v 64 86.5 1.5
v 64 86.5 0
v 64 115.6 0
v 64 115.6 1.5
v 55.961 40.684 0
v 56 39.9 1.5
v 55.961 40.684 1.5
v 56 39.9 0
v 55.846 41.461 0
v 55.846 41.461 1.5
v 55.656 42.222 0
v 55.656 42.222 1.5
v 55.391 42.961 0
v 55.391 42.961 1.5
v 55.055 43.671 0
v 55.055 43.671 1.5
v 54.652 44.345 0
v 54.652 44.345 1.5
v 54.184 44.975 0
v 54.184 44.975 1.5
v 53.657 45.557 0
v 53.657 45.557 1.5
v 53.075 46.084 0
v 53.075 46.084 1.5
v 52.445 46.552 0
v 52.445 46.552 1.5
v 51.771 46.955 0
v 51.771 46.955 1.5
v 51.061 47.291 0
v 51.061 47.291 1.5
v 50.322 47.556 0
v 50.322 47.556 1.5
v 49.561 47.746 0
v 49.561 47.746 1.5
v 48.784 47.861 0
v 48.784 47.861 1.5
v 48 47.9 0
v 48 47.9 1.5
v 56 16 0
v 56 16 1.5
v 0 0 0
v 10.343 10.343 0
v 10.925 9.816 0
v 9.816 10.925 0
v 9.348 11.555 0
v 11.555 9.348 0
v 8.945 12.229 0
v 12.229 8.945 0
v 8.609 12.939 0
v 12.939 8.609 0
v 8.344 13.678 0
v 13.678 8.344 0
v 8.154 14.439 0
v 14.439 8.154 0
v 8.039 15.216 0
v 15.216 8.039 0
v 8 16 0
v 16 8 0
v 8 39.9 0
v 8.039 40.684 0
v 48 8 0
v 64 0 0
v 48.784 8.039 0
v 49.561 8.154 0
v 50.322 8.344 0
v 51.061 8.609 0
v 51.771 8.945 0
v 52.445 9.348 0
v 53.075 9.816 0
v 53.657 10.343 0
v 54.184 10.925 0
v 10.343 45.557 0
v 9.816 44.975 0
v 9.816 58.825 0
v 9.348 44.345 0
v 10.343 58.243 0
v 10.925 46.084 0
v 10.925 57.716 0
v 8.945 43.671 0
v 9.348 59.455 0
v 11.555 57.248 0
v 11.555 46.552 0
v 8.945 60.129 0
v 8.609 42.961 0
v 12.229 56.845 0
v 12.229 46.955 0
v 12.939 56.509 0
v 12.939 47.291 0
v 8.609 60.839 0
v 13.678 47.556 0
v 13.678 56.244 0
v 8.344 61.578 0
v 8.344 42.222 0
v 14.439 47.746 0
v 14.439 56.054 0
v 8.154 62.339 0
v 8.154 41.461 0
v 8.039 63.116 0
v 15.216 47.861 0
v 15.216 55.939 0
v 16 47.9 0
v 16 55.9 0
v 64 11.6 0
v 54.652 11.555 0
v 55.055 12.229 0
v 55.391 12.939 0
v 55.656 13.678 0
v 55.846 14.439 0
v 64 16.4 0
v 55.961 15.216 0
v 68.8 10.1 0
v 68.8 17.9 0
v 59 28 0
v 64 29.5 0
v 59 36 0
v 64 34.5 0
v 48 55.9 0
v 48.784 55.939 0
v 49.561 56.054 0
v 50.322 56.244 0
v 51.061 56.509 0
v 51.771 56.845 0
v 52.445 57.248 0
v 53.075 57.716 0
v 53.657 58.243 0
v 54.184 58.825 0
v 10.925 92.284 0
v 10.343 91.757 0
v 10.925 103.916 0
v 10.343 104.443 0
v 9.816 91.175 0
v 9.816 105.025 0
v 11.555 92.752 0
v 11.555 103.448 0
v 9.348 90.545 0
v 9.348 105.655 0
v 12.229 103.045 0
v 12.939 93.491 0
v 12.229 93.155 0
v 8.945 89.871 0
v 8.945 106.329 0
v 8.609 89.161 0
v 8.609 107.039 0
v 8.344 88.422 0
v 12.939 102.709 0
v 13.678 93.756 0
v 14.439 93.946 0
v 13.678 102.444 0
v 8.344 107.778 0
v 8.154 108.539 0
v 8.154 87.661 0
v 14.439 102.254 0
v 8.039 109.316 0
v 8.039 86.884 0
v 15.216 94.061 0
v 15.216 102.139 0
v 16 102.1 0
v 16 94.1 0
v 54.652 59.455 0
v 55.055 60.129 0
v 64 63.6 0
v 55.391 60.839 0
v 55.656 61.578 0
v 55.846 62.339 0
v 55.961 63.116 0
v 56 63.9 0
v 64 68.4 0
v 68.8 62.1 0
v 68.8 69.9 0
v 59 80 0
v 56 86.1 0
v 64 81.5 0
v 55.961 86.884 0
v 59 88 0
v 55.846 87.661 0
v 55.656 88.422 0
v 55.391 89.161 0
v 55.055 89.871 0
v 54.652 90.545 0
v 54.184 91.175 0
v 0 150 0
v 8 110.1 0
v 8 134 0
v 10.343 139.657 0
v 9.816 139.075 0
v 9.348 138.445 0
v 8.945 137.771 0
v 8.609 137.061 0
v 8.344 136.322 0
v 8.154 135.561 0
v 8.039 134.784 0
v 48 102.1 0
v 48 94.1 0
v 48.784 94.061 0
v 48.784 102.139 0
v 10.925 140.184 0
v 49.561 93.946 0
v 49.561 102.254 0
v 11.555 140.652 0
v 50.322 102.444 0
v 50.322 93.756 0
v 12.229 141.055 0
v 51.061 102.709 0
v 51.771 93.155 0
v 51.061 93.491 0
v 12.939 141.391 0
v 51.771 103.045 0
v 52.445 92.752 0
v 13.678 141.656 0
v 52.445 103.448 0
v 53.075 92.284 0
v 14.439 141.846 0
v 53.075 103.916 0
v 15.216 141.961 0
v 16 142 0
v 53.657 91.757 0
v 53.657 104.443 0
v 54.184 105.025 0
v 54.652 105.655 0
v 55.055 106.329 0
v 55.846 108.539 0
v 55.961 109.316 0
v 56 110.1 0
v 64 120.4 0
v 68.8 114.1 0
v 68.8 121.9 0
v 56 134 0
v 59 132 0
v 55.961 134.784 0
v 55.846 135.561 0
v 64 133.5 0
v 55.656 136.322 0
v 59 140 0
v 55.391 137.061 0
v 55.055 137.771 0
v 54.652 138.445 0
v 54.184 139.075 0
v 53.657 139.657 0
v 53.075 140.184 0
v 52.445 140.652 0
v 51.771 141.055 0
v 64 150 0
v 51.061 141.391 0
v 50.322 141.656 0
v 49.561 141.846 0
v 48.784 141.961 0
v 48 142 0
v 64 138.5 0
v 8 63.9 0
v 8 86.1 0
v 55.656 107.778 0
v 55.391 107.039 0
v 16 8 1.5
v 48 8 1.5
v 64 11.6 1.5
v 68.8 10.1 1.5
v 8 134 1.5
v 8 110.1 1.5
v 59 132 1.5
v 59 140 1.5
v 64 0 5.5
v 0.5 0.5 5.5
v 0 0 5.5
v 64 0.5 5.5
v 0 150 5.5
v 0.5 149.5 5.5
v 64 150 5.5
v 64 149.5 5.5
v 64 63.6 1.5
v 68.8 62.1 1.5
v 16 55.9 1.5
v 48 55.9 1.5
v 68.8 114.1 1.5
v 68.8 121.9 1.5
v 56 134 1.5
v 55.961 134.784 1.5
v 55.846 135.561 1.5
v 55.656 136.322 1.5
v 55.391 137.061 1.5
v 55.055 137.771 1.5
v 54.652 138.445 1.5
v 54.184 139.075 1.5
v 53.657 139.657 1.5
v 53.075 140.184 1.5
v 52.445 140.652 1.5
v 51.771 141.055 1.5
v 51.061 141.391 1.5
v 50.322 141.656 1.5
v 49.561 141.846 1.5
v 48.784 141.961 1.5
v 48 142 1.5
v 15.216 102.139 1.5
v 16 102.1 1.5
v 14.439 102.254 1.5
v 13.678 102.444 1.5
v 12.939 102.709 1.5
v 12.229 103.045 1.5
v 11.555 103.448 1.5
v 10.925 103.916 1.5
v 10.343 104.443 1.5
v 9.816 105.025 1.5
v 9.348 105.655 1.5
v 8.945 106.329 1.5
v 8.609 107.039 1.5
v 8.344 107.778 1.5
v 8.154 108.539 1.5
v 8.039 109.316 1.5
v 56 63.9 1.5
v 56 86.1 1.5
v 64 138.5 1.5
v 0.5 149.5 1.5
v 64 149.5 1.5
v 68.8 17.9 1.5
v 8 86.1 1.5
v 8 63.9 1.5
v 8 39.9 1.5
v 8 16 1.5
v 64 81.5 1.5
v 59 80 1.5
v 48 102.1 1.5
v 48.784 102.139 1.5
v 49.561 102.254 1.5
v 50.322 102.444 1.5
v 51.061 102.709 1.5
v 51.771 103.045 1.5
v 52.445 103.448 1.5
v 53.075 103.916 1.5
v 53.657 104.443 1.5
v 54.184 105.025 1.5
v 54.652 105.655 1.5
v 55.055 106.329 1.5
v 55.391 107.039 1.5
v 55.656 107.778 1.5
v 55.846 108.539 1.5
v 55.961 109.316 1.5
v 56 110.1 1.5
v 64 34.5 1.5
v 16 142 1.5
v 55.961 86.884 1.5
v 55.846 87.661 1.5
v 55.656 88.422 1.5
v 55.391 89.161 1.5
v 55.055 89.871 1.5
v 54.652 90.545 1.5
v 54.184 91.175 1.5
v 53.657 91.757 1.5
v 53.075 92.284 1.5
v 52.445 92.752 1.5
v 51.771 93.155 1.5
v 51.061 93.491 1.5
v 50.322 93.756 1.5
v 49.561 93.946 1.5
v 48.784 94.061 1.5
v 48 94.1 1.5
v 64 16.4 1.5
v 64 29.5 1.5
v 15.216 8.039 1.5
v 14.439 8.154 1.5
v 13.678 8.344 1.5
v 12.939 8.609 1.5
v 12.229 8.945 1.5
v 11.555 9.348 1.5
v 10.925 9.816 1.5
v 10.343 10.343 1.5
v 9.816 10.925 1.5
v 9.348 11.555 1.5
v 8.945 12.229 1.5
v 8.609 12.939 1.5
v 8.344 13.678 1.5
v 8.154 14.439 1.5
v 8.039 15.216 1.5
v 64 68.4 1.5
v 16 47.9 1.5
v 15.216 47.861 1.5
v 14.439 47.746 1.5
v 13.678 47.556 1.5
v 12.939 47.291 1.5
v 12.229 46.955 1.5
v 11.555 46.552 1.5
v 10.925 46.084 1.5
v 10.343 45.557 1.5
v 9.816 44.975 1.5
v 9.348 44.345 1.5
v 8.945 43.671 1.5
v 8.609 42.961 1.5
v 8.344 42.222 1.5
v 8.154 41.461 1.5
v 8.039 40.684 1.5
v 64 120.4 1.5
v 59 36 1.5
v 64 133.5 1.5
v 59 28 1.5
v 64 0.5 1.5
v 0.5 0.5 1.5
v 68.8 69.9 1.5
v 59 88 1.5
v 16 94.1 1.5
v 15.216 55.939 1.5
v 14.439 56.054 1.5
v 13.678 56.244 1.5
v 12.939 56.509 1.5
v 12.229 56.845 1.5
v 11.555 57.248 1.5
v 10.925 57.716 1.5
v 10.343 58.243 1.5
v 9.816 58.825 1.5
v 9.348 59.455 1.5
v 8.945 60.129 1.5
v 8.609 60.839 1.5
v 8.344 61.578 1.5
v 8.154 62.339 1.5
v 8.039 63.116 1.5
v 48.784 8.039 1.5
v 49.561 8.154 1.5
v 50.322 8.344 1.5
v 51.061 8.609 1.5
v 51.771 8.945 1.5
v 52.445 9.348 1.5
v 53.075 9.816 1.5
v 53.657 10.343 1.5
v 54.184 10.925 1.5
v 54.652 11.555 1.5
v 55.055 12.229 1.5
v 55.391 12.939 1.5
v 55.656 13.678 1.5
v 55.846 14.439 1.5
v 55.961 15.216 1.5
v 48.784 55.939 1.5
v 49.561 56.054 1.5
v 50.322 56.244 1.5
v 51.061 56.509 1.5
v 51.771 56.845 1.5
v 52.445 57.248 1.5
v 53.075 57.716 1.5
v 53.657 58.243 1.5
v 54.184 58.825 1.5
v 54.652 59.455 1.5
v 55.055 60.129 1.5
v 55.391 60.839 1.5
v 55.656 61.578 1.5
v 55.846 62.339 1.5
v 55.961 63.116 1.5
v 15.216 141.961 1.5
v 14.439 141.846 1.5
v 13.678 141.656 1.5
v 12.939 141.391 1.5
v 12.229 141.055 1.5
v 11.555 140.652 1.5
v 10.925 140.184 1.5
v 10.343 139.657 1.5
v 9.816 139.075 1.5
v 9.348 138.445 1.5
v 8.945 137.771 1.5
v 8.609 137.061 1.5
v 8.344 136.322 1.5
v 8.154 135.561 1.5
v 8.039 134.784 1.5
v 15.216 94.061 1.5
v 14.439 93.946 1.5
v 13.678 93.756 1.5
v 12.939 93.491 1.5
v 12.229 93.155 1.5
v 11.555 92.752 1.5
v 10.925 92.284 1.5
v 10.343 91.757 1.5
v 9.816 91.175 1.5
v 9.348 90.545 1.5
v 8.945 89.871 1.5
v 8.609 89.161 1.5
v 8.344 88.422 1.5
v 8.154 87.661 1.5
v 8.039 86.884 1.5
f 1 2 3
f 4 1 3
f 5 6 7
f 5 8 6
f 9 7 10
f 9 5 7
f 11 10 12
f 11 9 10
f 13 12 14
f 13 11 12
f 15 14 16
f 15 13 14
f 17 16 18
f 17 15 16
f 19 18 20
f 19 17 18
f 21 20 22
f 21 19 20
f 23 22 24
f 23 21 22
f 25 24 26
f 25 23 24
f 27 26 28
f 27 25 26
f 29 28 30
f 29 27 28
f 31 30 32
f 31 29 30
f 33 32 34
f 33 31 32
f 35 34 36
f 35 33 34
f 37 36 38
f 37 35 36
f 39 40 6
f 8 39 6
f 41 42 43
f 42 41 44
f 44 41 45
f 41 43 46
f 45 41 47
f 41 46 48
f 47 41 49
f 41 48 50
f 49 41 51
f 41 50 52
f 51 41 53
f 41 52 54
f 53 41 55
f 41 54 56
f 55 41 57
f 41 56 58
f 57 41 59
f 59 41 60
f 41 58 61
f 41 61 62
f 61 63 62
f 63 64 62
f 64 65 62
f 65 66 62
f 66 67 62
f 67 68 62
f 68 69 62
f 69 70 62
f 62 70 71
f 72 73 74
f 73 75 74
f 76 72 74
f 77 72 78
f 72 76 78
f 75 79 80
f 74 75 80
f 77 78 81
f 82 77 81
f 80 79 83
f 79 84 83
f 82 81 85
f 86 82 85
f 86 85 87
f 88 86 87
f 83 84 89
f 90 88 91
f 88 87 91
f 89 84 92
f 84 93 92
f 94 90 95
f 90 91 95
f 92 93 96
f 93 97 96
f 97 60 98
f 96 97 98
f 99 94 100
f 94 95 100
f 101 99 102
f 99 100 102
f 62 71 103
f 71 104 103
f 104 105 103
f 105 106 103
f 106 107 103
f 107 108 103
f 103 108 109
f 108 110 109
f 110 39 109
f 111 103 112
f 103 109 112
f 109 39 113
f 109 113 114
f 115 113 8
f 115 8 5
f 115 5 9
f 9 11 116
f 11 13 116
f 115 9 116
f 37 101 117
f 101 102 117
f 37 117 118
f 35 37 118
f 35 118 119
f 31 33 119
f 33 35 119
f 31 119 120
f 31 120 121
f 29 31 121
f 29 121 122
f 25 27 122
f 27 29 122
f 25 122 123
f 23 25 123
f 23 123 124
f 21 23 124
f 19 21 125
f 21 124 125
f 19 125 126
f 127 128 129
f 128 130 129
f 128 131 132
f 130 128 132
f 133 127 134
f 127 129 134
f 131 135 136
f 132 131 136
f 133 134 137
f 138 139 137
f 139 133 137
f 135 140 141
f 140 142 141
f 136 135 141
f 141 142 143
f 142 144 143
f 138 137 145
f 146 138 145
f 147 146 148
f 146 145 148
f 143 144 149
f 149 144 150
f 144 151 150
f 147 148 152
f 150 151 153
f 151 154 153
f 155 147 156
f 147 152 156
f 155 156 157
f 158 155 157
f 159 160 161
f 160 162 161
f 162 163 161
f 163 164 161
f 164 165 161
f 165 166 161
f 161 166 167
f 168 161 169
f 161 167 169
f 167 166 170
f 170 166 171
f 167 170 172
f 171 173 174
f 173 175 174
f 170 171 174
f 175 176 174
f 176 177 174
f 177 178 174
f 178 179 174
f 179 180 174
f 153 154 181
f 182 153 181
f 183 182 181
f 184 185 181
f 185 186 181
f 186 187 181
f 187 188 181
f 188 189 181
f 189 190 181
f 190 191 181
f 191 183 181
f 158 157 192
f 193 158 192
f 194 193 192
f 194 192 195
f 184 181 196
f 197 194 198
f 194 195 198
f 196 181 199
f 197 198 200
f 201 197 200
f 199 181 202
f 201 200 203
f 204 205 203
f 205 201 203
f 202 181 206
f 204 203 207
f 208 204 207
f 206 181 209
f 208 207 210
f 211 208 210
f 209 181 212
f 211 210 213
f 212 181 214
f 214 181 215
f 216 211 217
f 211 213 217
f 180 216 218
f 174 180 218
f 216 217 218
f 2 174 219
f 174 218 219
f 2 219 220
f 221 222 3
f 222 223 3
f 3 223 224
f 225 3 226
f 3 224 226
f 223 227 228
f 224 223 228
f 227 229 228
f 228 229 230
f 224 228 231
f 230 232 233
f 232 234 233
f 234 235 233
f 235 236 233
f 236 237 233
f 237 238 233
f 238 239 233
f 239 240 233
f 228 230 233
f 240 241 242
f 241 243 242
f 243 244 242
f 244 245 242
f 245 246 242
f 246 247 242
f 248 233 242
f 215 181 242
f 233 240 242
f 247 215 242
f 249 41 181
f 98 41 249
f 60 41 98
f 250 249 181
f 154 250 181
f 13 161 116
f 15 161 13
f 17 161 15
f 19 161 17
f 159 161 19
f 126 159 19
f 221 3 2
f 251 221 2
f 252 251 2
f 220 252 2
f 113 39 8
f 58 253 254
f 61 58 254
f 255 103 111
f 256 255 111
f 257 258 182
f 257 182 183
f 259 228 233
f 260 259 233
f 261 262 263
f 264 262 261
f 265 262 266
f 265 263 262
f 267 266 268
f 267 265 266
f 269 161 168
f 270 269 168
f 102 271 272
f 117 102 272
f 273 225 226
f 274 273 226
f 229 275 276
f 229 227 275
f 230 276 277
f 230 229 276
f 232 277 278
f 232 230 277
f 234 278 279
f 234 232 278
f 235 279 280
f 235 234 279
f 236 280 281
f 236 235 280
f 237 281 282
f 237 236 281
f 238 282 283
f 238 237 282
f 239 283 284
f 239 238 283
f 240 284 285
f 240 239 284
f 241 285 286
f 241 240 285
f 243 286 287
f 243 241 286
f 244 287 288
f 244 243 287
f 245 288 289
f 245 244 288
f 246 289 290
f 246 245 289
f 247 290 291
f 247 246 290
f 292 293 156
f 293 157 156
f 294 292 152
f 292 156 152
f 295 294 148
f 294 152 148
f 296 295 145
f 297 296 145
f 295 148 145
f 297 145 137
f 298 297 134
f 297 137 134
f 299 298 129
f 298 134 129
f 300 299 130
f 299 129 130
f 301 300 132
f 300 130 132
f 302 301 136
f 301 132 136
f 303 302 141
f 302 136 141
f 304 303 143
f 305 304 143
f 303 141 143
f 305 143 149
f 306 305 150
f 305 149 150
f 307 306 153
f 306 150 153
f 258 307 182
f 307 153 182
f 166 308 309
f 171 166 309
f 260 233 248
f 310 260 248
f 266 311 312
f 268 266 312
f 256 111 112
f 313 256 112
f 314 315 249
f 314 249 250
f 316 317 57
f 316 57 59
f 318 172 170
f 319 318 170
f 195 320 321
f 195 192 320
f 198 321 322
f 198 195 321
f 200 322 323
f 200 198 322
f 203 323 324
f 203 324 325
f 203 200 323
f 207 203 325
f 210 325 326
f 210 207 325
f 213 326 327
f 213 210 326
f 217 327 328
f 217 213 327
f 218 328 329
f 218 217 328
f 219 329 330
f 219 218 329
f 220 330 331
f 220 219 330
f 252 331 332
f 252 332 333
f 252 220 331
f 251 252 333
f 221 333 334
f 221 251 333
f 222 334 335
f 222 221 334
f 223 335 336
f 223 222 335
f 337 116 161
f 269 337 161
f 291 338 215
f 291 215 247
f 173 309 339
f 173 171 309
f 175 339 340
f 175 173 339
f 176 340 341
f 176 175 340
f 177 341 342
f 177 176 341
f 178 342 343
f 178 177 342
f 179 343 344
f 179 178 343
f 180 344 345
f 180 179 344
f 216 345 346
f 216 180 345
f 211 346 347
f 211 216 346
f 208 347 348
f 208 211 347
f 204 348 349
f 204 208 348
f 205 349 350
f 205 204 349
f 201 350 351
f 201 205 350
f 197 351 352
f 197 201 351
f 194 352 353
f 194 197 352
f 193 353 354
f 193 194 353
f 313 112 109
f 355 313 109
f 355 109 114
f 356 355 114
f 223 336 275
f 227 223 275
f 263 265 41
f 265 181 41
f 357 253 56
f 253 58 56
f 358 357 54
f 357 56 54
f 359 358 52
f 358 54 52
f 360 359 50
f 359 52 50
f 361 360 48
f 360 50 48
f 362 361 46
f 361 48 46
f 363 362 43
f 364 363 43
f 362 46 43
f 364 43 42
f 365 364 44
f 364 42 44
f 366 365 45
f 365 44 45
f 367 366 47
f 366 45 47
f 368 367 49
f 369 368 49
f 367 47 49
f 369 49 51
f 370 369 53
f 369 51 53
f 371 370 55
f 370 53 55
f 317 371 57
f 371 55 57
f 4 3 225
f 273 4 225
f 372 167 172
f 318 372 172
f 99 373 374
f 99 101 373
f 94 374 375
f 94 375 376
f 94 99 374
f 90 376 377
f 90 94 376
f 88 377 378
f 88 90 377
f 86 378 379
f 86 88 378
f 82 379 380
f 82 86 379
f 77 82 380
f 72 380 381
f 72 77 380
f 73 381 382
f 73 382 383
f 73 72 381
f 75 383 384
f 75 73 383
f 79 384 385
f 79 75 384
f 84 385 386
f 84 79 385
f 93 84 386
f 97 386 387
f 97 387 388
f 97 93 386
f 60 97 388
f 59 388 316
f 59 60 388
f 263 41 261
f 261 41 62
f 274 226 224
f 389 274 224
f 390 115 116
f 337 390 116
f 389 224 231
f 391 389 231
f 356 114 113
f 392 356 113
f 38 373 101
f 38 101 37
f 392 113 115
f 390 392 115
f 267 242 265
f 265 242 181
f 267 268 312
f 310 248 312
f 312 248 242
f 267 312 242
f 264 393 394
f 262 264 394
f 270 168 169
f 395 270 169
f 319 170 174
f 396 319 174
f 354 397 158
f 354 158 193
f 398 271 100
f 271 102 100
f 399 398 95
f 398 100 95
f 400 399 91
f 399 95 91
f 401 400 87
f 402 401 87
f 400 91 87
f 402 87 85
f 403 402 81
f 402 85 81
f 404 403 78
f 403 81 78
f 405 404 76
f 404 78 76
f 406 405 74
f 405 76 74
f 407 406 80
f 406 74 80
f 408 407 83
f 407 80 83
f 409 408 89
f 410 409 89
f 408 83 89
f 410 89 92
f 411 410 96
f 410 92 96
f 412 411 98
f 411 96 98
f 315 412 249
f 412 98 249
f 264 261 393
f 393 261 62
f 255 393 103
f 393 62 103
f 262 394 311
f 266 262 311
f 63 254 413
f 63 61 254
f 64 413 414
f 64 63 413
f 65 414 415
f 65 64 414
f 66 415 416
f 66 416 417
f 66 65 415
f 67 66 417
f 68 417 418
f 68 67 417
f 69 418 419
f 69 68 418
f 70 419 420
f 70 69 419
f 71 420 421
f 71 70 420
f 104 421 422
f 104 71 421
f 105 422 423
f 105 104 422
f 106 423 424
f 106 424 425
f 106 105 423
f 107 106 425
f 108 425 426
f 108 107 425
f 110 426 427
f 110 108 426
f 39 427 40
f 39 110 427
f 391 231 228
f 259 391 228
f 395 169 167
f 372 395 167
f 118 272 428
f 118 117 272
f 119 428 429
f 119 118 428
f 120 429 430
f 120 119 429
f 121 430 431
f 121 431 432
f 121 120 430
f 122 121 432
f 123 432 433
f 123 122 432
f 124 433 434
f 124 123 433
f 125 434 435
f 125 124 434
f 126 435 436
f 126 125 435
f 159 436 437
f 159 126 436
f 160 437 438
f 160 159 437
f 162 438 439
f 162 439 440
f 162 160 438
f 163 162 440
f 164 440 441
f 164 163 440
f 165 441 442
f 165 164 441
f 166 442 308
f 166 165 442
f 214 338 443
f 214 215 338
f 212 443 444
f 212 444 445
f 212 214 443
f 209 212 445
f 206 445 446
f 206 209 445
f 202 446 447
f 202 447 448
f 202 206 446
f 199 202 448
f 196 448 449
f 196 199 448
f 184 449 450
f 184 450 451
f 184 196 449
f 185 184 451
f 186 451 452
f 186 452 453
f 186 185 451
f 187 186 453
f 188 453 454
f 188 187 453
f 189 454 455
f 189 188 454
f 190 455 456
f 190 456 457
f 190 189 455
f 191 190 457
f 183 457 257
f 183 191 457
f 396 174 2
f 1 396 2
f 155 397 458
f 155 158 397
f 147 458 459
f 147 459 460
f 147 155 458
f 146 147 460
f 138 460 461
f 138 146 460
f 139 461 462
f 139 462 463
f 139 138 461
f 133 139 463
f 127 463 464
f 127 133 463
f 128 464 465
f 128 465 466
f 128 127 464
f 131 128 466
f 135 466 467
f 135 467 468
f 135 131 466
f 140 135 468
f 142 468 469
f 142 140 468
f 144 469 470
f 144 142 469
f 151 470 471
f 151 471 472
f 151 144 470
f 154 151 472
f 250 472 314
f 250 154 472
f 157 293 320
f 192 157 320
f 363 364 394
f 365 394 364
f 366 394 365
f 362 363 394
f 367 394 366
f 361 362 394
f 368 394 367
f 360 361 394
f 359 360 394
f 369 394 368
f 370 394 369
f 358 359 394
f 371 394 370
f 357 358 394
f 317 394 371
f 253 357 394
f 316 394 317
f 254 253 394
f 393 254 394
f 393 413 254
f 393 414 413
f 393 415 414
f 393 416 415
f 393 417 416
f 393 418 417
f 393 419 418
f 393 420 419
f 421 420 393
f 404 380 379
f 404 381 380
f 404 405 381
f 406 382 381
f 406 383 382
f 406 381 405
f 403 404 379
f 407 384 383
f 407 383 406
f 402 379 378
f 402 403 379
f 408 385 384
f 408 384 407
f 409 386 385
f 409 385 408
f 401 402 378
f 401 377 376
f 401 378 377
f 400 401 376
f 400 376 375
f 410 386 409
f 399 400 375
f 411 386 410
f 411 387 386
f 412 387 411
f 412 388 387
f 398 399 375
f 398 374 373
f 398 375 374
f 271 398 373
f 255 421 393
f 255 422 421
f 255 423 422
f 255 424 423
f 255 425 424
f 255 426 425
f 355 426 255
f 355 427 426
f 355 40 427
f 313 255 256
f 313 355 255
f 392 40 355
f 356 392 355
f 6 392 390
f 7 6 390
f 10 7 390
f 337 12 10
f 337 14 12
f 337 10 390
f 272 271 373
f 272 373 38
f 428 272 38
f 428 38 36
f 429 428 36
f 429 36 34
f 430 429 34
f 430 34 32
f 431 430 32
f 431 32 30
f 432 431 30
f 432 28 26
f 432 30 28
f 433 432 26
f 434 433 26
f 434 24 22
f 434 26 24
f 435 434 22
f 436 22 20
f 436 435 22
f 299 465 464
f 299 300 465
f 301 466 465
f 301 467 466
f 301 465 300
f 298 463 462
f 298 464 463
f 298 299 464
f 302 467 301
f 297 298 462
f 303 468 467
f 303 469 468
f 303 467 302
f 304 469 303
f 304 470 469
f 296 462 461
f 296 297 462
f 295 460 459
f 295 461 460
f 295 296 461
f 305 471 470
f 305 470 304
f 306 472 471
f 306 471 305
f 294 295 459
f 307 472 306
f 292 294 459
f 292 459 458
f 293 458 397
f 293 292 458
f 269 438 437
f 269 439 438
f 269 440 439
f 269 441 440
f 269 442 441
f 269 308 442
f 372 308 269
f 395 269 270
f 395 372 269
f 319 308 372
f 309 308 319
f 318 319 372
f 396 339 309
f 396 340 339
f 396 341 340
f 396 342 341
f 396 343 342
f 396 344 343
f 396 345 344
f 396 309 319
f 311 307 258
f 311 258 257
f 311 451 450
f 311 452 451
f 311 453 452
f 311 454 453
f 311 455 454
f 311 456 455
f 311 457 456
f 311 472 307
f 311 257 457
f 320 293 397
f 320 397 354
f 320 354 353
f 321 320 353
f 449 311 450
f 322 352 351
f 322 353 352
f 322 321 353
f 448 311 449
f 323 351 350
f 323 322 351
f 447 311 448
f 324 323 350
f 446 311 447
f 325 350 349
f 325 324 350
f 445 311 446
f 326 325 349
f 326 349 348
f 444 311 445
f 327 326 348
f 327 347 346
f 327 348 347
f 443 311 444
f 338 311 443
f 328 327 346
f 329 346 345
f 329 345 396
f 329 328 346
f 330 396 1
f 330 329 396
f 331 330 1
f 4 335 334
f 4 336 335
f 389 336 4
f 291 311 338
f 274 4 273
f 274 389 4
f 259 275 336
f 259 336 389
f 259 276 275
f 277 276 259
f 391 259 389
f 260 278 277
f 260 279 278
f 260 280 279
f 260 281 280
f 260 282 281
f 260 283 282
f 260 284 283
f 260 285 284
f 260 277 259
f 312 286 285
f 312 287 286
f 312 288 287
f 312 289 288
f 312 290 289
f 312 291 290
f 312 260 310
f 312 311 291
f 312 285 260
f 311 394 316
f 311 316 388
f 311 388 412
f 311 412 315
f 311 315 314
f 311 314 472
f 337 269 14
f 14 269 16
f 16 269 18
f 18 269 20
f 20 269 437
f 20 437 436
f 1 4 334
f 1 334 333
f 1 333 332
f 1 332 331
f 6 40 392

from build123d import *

# Parameters (mm, degrees)
F1_DEPTH = 1.5
F2_W     = 48
F2_H     = 39.9
F2_H_2   = 38.2
F3_DEPTH = 1.501
F4_R     = 8
F6_DEPTH = 4


with BuildPart() as f1:
    # F0 (on Top) → F1 (new body)
    with BuildSketch(Plane.XY):
        Polygon((0, 150), (0, 0), (64, 0), (64, 11.6), (68.8, 10.1), (68.8, 17.9), (64, 16.4), (64, 29.5), (59, 28), (59, 36), (64, 34.5), (64, 63.6), (68.8, 62.1), (68.8, 69.9), (64, 68.4), (64, 81.5), (59, 80), (59, 88), (64, 86.5), (64, 115.6), (68.8, 114.1), (68.8, 121.9), (64, 120.4), (64, 133.5), (59, 132), (59, 140), (64, 138.5), (64, 150), align=None)
    extrude(amount=F1_DEPTH)

    # F2 (on face) → F3 (cut, through all)
    with BuildSketch(Plane.XY.offset(1.5)):
        with Locations((32, 122.05)):
            Rectangle(F2_W, F2_H)
        with Locations((32, 75)):
            Rectangle(F2_W, F2_H_2)
        with Locations((32, 27.95)):
            Rectangle(F2_W, F2_H)
    extrude(amount=-F3_DEPTH, mode=Mode.SUBTRACT)

    # F4
    f4_edges = [f1.edges().sort_by_distance(p)[0] for p in [
        (8, 142, 0.75),
        (8, 94.1, 0.75),
        (8, 47.9, 0.75),
        (56, 142, 0.75),
        (56, 94.1, 0.75),
        (56, 47.9, 0.75),
        (56, 102.1, 0.75),
        (56, 55.9, 0.75),
        (56, 8, 0.75),
        (8, 8, 0.75),
        (8, 55.9, 0.75),
        (8, 102.1, 0.75),
    ]]
    fillet(f4_edges, radius=F4_R)

    # F5 (on face) → F6 (join)
    with BuildSketch(Plane.XY.offset(1.5)):
        Polygon((64, 149.5), (64, 150), (0, 150), (0, 0), (64, 0), (64, 0.5), (0.5, 0.5), (0.5, 149.5), align=None)
    extrude(amount=F6_DEPTH)


solid = f1.part
